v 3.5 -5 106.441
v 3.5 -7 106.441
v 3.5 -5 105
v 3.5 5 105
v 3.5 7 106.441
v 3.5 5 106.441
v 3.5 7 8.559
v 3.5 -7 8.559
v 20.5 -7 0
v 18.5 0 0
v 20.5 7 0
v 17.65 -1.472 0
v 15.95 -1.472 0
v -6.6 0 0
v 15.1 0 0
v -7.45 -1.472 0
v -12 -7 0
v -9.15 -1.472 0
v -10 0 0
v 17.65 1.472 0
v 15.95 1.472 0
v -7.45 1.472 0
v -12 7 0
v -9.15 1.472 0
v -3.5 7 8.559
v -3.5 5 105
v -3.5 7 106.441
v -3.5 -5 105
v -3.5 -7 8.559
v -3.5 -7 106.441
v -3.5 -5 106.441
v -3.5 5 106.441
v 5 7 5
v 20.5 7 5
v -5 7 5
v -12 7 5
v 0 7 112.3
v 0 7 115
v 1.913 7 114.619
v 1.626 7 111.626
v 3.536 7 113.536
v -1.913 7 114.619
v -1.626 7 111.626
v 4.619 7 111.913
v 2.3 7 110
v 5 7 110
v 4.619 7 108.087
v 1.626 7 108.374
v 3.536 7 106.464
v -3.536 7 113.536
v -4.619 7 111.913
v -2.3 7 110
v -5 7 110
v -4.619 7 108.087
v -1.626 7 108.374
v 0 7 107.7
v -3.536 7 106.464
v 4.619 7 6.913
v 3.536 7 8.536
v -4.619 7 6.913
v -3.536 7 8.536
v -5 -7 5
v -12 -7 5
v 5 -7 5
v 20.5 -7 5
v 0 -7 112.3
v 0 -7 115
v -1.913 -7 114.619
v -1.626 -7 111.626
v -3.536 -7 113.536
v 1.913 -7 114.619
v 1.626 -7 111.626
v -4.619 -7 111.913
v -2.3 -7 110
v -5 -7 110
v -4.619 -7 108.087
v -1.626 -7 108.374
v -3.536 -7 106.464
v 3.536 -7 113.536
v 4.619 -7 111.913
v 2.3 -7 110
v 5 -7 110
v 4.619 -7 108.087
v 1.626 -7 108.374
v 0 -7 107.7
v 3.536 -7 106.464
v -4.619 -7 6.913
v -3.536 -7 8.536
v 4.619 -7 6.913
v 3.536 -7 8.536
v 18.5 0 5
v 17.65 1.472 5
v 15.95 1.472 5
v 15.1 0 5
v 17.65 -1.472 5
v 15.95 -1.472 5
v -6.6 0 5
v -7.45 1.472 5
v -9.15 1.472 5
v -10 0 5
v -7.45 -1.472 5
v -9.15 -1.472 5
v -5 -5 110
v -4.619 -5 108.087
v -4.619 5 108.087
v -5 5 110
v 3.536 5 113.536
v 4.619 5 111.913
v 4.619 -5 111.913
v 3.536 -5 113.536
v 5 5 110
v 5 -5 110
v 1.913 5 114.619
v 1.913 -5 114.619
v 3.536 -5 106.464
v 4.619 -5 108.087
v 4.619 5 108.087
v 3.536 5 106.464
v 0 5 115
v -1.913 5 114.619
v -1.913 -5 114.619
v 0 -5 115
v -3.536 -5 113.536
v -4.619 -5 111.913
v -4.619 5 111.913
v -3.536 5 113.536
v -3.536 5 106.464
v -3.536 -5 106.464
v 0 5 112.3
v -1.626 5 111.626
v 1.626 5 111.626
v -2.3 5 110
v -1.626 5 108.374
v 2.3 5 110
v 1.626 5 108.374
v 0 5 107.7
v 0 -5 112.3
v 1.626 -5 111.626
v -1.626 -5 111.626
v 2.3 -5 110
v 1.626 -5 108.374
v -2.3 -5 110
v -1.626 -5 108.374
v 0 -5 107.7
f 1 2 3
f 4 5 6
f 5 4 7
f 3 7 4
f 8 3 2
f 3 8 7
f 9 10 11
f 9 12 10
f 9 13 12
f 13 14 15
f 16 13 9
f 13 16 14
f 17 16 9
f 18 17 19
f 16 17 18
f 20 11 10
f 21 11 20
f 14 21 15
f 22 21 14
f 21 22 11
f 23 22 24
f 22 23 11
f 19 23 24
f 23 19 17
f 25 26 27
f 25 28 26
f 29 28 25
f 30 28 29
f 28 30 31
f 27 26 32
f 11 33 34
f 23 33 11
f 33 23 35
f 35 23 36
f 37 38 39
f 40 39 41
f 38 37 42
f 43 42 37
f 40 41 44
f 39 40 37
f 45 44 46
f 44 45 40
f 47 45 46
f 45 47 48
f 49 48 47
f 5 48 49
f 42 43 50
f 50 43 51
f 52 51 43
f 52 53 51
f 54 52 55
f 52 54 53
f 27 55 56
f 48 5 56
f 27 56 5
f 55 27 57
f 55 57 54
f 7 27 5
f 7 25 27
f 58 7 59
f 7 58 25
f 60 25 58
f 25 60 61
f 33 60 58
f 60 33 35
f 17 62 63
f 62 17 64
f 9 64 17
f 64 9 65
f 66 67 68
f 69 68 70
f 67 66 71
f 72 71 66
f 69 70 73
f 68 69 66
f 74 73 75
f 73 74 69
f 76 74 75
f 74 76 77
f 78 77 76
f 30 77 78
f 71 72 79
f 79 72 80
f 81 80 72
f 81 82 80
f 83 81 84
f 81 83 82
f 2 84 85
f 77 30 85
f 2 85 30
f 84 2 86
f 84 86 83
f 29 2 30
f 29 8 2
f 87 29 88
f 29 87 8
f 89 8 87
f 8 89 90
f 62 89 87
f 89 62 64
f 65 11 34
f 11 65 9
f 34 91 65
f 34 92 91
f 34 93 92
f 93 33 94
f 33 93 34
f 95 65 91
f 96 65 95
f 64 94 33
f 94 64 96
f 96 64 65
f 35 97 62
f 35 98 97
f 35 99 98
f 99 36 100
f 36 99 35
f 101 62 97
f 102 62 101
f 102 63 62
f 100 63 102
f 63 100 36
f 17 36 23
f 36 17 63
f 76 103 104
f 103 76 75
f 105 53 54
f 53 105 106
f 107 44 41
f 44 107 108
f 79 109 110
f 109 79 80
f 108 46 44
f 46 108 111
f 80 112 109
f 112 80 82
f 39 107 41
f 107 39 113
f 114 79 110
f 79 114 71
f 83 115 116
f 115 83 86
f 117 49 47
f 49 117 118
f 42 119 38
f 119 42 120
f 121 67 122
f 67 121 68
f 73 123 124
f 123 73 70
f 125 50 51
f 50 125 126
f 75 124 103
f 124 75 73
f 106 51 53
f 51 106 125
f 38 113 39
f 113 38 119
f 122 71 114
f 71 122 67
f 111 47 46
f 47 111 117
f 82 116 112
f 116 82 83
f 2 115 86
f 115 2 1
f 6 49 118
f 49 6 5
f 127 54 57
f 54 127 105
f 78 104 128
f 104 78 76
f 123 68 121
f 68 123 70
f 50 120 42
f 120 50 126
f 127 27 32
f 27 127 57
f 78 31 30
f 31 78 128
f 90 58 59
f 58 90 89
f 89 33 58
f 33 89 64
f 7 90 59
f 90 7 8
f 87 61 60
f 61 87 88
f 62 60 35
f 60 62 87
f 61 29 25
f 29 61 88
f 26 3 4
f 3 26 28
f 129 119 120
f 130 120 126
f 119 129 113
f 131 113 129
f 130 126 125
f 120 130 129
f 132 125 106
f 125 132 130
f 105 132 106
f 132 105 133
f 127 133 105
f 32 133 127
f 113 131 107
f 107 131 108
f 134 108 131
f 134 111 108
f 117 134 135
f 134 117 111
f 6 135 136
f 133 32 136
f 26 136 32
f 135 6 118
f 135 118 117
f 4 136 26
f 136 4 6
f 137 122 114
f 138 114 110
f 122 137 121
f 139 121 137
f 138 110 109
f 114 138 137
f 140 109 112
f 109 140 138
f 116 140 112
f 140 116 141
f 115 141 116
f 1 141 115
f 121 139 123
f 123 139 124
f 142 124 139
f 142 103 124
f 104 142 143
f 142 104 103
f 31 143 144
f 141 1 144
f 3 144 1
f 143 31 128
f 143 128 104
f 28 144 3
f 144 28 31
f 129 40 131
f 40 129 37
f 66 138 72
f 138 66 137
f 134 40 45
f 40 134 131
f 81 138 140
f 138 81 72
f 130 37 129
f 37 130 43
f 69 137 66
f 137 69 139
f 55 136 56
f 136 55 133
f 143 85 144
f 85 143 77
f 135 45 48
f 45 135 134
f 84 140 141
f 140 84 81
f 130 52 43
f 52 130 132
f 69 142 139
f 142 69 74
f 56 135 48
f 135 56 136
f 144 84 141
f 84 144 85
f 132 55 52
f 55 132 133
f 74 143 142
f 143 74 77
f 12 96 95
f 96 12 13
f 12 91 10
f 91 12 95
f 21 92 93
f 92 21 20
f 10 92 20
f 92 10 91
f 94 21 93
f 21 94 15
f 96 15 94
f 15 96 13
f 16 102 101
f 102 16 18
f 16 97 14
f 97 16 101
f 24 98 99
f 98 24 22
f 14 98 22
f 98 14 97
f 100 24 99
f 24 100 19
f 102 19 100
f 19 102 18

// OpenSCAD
module foot(a, c, msr, shr){
    /* This is the model for the samson post that holds the 
    center of the walking beam in its place*/
    
    sp = [7, 14, a+c];    // Samson post
    lf = [20.5, 14, 5];   // Long horizontal foot
    sf = [12, 14, 5];     // Short horizontal foot    
    sor = 5;              // Mounting point outer radius
    
    difference(){
        color([.5,.5,.5])
        union(){
            translate([0, 0, sp.z/2])
                cube(sp, center = true);
            translate([lf.x/2, 0, lf.z/2])
                cube(lf, center = true);
            translate([-sf.x/2, 0, sf.z/2])
                cube(sf, center = true);
            // Mounting point
            translate([0,0,sp.z])
            rotate([90,0,0])
                cylinder(r = sor, h = sp.y, center = true);
            // Foot reinforcement
            translate([0, 0, sor])
            rotate([90, 0, 0])
                cylinder(r = sor, h = sp.y, center = true);
        }

        // Mounting point peg
        translate([0,0,sp.z])
            cube([2*sor, 10 ,2*sor], center = true);
        
        // Mounting point hole
        translate([0, 0, sp.z])
        rotate([90, 0, 0])
            cylinder(r = msr, h = sp.y+1, center = true);
        
        // Ground screw holes
        translate([lf.x - shr - 2, 0, lf.z/2])
            cylinder(r = shr, h = lf.z, center = true);
        translate([-sf.x + shr + 2, 0, lf.z/2])
            cylinder(r = shr, h = sf.z, center = true);
    }
}

foot(50, 60, 2.3, 1.7);
